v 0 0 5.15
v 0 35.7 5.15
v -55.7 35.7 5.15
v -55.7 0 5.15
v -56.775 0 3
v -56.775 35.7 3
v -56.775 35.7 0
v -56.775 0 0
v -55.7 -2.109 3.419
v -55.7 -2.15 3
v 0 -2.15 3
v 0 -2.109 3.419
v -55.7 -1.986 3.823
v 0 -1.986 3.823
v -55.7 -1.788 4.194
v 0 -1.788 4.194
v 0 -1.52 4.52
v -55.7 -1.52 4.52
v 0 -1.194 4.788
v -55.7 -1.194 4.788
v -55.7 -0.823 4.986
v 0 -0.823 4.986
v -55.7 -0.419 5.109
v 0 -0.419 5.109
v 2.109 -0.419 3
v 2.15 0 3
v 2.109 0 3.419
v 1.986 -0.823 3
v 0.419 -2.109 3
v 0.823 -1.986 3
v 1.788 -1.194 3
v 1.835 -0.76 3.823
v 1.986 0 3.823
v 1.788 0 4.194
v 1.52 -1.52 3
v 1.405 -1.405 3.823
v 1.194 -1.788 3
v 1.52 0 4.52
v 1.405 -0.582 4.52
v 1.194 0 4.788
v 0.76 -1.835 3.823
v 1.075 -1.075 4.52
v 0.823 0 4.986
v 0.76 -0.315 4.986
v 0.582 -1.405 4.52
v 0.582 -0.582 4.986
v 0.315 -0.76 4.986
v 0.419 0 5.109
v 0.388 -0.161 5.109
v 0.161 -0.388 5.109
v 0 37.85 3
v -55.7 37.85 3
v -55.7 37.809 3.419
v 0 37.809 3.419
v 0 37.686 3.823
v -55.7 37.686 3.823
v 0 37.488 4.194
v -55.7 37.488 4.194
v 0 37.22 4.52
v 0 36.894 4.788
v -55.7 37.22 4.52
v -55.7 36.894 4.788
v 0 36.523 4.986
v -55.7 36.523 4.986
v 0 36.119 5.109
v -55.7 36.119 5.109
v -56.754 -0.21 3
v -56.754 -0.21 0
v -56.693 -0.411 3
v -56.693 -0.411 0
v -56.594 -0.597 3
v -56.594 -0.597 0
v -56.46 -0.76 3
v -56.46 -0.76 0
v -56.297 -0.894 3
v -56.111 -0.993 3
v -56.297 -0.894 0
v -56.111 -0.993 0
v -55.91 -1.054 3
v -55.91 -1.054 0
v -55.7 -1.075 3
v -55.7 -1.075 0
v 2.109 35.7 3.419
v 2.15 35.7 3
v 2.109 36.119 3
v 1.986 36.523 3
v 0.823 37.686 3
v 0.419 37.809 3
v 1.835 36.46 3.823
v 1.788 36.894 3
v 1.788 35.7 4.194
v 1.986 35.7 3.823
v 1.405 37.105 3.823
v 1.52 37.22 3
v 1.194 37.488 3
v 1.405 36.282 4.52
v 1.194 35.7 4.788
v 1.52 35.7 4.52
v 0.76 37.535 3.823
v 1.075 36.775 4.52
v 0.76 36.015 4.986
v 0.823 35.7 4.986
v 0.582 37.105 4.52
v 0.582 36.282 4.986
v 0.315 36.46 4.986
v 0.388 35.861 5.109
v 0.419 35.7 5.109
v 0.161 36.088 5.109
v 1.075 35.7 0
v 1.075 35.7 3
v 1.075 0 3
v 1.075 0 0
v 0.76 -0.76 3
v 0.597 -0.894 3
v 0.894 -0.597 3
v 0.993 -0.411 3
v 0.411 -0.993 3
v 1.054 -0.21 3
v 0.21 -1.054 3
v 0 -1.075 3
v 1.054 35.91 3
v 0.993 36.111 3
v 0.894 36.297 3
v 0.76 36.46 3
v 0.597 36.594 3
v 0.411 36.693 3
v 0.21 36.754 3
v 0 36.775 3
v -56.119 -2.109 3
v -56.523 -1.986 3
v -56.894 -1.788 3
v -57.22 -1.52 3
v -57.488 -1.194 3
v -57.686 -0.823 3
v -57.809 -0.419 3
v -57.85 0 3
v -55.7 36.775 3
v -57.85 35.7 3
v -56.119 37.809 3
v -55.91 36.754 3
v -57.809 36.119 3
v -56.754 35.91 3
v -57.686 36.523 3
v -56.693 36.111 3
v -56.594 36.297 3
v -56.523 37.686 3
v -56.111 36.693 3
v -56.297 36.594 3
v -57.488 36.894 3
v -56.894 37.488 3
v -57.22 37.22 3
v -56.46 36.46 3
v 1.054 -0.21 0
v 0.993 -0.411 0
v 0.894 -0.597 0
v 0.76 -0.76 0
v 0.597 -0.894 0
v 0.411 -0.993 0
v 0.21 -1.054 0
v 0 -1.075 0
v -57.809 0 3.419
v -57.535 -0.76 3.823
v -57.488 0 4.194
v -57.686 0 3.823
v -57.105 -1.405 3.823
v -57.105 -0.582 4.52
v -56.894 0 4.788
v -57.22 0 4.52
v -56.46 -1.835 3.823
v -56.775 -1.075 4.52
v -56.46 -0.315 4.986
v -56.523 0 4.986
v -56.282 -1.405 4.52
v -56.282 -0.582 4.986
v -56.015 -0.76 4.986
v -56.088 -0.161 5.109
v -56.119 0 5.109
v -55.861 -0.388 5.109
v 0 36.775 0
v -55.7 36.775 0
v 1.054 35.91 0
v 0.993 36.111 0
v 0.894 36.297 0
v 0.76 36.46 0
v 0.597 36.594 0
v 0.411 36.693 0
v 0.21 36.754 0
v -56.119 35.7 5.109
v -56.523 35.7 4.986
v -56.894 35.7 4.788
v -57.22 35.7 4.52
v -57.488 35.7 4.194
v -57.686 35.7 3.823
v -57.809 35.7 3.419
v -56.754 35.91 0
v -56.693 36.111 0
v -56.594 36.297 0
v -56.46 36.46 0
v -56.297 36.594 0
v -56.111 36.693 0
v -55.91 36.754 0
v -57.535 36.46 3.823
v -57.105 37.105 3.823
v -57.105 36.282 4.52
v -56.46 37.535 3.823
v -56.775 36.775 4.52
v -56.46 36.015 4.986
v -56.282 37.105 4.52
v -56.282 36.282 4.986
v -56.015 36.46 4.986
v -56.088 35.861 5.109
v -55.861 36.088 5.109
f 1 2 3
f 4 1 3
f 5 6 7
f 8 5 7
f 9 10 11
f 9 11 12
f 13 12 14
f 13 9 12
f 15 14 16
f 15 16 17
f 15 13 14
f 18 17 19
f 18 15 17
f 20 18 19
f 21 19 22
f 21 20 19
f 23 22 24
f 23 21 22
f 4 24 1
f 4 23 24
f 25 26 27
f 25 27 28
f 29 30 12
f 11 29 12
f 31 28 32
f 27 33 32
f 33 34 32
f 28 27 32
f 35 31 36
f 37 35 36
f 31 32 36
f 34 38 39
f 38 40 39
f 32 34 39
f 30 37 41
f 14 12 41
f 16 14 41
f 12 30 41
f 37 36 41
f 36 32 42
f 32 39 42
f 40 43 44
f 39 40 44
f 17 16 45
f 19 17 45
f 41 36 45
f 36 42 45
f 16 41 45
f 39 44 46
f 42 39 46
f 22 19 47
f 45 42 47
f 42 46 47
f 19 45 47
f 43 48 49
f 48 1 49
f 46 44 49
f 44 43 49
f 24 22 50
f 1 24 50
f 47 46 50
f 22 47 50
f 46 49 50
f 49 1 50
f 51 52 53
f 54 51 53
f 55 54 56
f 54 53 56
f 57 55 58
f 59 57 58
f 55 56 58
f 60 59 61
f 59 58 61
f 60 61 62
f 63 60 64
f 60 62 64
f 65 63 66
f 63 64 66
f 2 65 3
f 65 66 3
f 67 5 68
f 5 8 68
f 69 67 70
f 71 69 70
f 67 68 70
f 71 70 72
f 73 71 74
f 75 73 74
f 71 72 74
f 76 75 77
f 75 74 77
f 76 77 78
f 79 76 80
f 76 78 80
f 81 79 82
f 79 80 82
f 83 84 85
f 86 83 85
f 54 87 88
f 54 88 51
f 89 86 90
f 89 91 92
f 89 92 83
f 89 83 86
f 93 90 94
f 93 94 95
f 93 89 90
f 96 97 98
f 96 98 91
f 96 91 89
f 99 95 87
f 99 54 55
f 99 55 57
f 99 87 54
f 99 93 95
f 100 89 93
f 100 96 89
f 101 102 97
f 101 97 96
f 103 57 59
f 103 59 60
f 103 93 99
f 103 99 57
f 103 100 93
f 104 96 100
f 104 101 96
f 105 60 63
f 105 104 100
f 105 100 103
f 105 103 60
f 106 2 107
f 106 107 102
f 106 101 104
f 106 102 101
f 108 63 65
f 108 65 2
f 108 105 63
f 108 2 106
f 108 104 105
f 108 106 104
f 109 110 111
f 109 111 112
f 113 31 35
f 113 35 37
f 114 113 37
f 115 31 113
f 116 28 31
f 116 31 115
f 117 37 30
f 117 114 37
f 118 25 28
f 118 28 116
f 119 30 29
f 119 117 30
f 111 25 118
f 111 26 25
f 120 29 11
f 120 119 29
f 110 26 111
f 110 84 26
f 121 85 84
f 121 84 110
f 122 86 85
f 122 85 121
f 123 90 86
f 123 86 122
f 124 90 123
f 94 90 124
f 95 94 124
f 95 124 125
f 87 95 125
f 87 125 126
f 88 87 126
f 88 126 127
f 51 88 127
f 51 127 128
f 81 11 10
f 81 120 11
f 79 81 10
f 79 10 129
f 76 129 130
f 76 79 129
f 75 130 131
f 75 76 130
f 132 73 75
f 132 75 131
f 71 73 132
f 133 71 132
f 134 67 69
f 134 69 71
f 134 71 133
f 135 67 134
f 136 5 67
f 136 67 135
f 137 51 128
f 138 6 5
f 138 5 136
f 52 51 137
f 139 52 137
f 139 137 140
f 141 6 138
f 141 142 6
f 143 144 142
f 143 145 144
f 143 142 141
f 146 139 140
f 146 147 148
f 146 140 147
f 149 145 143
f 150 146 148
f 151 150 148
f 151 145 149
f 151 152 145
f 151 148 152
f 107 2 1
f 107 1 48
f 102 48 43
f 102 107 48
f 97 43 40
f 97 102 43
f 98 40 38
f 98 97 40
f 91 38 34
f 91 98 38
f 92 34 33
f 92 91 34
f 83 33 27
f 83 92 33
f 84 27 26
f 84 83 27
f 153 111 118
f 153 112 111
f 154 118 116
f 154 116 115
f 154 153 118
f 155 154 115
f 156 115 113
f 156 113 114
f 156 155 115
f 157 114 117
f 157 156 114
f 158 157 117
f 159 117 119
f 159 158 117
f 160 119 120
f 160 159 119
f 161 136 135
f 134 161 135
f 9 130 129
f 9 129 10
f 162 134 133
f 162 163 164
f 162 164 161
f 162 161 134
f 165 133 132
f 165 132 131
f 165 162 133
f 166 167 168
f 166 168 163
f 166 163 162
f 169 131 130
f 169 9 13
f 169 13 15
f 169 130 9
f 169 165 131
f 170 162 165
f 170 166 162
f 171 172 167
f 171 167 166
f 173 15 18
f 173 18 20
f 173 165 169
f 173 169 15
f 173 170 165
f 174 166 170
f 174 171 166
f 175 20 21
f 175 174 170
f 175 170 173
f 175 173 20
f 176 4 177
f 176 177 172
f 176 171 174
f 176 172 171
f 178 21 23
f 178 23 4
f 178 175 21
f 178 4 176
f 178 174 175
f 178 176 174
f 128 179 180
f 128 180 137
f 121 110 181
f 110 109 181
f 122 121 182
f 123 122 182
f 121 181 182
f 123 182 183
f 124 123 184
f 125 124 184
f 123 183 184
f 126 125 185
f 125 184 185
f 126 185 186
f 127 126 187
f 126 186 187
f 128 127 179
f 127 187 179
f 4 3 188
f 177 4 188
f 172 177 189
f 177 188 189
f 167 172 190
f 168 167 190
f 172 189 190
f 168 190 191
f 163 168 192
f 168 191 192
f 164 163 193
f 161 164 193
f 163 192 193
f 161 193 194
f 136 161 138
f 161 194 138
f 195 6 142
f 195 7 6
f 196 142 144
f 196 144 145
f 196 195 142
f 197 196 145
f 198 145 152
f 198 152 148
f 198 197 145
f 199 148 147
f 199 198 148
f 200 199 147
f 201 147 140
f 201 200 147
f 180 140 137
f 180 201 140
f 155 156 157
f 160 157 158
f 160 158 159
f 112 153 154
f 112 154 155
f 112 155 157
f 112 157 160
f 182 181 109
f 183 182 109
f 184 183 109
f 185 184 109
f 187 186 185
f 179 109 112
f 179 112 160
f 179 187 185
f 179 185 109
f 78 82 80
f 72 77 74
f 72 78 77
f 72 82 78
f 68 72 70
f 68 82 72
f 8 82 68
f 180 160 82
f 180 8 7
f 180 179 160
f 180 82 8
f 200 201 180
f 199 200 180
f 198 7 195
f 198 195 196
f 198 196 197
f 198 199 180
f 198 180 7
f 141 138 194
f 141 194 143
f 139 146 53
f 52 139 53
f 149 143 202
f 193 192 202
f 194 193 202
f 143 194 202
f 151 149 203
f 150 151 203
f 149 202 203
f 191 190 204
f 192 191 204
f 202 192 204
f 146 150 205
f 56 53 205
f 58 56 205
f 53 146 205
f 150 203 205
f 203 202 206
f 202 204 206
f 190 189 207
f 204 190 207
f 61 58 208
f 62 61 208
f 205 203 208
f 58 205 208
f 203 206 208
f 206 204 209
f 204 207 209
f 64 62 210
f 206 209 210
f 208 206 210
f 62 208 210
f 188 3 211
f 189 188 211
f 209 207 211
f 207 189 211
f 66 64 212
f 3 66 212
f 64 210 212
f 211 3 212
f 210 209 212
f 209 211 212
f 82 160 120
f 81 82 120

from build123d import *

# Parameters (mm, degrees)
REVOLUTION_ANGLE            = -90
PAD_DEPTH                   = 27.85
PAD001_DEPTH                = 17.85
PAD001_MIRRORED_2_DEPTH     = 17.85
PAD_MIRRORED_2_DEPTH        = 27.85
REVOLUTION_MIRRORED_2_ANGLE = 90


with BuildPart() as part:
    # Sketch → Revolution (revolve)
    with BuildSketch(Plane.XZ):
        with BuildLine():
            Line((0, 0), (0, 5.15))
            ThreePointArc((2.15, 3), (1.52028, 4.52028), (0, 5.15))
            Line((2.15, 3), (1.075, 3))
            Line((1.075, 3), (1.075, 0))
            Line((1.075, 0), (0, 0))
        make_face()
    revolution = revolve(axis=Axis((0, 0, 0), (0, 0, 1)), revolution_arc=REVOLUTION_ANGLE)

    # Revolution Face6 → Pad (new)
    with BuildSketch(Plane(origin=(0, -0.736084, 2.777594), x_dir=(0, 1, 0), z_dir=(-1, 0, 0))):
        with BuildLine():
            Line((0.736084, -2.372406), (0.736084, 2.777594))
            Line((0.736084, 2.777594), (-0.338916, 2.777594))
            Line((-0.338916, 2.777594), (-0.338916, -0.222406))
            Line((-0.338916, -0.222406), (-1.413916, -0.222406))
            ThreePointArc((-1.413916, -0.222406), (-0.784195, -1.742686), (0.736084, -2.372406))
        make_face()
    pad = extrude(amount=PAD_DEPTH)

    # Pad Face7 → Pad001 (add)
    with BuildSketch(Plane(origin=(-13.256201, 0, 2.584242), x_dir=(1, 0, 0), z_dir=(0, 1, 0))):
        with BuildLine():
            ThreePointArc((13.256201, -2.565758), (14.776481, -1.936038), (15.406201, -0.415758))
            Line((15.406201, -0.415758), (14.331201, -0.415758))
            Line((14.331201, -0.415758), (14.331201, 2.584242))
            Line((14.331201, 2.584242), (-14.593799, 2.584242))
            Line((-14.593799, 2.584242), (-14.593799, -2.565758))
            Line((-14.593799, -2.565758), (13.256201, -2.565758))
        make_face()
    pad001 = extrude(amount=PAD001_DEPTH)

    # Pad Face7 Mirrored 2 → Pad001 Mirrored 2 (add)
    with BuildSketch(Plane(origin=(-42.443799, 0, 2.584242), x_dir=(-1, 0, 0), z_dir=(0, -1, 0))):
        with BuildLine():
            ThreePointArc((13.256201, -2.565758), (14.776481, -1.936038), (15.406201, -0.415758))
            Line((15.406201, -0.415758), (14.331201, -0.415758))
            Line((14.331201, -0.415758), (14.331201, 2.584242))
            Line((14.331201, 2.584242), (-14.593799, 2.584242))
            Line((-14.593799, 2.584242), (-14.593799, -2.565758))
            Line((-14.593799, -2.565758), (13.256201, -2.565758))
        make_face()
    pad001_mirrored_2 = extrude(amount=-PAD001_MIRRORED_2_DEPTH)

    # Revolution Face6 Mirrored 2 → Pad Mirrored 2 (add)
    with BuildSketch(Plane(origin=(-55.7, -0.736084, 2.777594), x_dir=(0, 1, 0), z_dir=(-1, 0, 0))):
        with BuildLine():
            Line((0.736084, -2.372406), (0.736084, 2.777594))
            Line((0.736084, 2.777594), (-0.338916, 2.777594))
            Line((-0.338916, 2.777594), (-0.338916, -0.222406))
            Line((-0.338916, -0.222406), (-1.413916, -0.222406))
            ThreePointArc((-1.413916, -0.222406), (-0.784195, -1.742686), (0.736084, -2.372406))
        make_face()
    pad_mirrored_2 = extrude(amount=-PAD_MIRRORED_2_DEPTH)

    # Sketch Mirrored 2 → Revolution Mirrored 2 (revolve)
    with BuildSketch(Plane(origin=(-55.7, 0, 0), x_dir=(-1, 0, 0), z_dir=(0, 1, 0))):
        with BuildLine():
            Line((0, 0), (0, 5.15))
            ThreePointArc((2.15, 3), (1.52028, 4.52028), (0, 5.15))
            Line((2.15, 3), (1.075, 3))
            Line((1.075, 3), (1.075, 0))
            Line((1.075, 0), (0, 0))
        make_face()
    revolution_mirrored_2 = revolve(axis=Axis((-55.7, 0, 0), (0, 0, 1)), revolution_arc=REVOLUTION_MIRRORED_2_ANGLE)

    # Mirrored001: Pad001, Pad, Revolution, Pad001 Mirrored 2, Pad Mirrored 2, Revolution Mirrored 2 across face of Pad001
    add(pad001.mirror(Plane(origin=(-13.256201, 17.85, 2.584242), x_dir=(-1, 0, 0), z_dir=(0, 1, 0))))
    add(pad.mirror(Plane(origin=(-13.256201, 17.85, 2.584242), x_dir=(-1, 0, 0), z_dir=(0, 1, 0))))
    add(revolution.mirror(Plane(origin=(-13.256201, 17.85, 2.584242), x_dir=(-1, 0, 0), z_dir=(0, 1, 0))))
    add(pad001_mirrored_2.mirror(Plane(origin=(-13.256201, 17.85, 2.584242), x_dir=(-1, 0, 0), z_dir=(0, 1, 0))))
    add(pad_mirrored_2.mirror(Plane(origin=(-13.256201, 17.85, 2.584242), x_dir=(-1, 0, 0), z_dir=(0, 1, 0))))
    add(revolution_mirrored_2.mirror(Plane(origin=(-13.256201, 17.85, 2.584242), x_dir=(-1, 0, 0), z_dir=(0, 1, 0))))


solid = part.part
